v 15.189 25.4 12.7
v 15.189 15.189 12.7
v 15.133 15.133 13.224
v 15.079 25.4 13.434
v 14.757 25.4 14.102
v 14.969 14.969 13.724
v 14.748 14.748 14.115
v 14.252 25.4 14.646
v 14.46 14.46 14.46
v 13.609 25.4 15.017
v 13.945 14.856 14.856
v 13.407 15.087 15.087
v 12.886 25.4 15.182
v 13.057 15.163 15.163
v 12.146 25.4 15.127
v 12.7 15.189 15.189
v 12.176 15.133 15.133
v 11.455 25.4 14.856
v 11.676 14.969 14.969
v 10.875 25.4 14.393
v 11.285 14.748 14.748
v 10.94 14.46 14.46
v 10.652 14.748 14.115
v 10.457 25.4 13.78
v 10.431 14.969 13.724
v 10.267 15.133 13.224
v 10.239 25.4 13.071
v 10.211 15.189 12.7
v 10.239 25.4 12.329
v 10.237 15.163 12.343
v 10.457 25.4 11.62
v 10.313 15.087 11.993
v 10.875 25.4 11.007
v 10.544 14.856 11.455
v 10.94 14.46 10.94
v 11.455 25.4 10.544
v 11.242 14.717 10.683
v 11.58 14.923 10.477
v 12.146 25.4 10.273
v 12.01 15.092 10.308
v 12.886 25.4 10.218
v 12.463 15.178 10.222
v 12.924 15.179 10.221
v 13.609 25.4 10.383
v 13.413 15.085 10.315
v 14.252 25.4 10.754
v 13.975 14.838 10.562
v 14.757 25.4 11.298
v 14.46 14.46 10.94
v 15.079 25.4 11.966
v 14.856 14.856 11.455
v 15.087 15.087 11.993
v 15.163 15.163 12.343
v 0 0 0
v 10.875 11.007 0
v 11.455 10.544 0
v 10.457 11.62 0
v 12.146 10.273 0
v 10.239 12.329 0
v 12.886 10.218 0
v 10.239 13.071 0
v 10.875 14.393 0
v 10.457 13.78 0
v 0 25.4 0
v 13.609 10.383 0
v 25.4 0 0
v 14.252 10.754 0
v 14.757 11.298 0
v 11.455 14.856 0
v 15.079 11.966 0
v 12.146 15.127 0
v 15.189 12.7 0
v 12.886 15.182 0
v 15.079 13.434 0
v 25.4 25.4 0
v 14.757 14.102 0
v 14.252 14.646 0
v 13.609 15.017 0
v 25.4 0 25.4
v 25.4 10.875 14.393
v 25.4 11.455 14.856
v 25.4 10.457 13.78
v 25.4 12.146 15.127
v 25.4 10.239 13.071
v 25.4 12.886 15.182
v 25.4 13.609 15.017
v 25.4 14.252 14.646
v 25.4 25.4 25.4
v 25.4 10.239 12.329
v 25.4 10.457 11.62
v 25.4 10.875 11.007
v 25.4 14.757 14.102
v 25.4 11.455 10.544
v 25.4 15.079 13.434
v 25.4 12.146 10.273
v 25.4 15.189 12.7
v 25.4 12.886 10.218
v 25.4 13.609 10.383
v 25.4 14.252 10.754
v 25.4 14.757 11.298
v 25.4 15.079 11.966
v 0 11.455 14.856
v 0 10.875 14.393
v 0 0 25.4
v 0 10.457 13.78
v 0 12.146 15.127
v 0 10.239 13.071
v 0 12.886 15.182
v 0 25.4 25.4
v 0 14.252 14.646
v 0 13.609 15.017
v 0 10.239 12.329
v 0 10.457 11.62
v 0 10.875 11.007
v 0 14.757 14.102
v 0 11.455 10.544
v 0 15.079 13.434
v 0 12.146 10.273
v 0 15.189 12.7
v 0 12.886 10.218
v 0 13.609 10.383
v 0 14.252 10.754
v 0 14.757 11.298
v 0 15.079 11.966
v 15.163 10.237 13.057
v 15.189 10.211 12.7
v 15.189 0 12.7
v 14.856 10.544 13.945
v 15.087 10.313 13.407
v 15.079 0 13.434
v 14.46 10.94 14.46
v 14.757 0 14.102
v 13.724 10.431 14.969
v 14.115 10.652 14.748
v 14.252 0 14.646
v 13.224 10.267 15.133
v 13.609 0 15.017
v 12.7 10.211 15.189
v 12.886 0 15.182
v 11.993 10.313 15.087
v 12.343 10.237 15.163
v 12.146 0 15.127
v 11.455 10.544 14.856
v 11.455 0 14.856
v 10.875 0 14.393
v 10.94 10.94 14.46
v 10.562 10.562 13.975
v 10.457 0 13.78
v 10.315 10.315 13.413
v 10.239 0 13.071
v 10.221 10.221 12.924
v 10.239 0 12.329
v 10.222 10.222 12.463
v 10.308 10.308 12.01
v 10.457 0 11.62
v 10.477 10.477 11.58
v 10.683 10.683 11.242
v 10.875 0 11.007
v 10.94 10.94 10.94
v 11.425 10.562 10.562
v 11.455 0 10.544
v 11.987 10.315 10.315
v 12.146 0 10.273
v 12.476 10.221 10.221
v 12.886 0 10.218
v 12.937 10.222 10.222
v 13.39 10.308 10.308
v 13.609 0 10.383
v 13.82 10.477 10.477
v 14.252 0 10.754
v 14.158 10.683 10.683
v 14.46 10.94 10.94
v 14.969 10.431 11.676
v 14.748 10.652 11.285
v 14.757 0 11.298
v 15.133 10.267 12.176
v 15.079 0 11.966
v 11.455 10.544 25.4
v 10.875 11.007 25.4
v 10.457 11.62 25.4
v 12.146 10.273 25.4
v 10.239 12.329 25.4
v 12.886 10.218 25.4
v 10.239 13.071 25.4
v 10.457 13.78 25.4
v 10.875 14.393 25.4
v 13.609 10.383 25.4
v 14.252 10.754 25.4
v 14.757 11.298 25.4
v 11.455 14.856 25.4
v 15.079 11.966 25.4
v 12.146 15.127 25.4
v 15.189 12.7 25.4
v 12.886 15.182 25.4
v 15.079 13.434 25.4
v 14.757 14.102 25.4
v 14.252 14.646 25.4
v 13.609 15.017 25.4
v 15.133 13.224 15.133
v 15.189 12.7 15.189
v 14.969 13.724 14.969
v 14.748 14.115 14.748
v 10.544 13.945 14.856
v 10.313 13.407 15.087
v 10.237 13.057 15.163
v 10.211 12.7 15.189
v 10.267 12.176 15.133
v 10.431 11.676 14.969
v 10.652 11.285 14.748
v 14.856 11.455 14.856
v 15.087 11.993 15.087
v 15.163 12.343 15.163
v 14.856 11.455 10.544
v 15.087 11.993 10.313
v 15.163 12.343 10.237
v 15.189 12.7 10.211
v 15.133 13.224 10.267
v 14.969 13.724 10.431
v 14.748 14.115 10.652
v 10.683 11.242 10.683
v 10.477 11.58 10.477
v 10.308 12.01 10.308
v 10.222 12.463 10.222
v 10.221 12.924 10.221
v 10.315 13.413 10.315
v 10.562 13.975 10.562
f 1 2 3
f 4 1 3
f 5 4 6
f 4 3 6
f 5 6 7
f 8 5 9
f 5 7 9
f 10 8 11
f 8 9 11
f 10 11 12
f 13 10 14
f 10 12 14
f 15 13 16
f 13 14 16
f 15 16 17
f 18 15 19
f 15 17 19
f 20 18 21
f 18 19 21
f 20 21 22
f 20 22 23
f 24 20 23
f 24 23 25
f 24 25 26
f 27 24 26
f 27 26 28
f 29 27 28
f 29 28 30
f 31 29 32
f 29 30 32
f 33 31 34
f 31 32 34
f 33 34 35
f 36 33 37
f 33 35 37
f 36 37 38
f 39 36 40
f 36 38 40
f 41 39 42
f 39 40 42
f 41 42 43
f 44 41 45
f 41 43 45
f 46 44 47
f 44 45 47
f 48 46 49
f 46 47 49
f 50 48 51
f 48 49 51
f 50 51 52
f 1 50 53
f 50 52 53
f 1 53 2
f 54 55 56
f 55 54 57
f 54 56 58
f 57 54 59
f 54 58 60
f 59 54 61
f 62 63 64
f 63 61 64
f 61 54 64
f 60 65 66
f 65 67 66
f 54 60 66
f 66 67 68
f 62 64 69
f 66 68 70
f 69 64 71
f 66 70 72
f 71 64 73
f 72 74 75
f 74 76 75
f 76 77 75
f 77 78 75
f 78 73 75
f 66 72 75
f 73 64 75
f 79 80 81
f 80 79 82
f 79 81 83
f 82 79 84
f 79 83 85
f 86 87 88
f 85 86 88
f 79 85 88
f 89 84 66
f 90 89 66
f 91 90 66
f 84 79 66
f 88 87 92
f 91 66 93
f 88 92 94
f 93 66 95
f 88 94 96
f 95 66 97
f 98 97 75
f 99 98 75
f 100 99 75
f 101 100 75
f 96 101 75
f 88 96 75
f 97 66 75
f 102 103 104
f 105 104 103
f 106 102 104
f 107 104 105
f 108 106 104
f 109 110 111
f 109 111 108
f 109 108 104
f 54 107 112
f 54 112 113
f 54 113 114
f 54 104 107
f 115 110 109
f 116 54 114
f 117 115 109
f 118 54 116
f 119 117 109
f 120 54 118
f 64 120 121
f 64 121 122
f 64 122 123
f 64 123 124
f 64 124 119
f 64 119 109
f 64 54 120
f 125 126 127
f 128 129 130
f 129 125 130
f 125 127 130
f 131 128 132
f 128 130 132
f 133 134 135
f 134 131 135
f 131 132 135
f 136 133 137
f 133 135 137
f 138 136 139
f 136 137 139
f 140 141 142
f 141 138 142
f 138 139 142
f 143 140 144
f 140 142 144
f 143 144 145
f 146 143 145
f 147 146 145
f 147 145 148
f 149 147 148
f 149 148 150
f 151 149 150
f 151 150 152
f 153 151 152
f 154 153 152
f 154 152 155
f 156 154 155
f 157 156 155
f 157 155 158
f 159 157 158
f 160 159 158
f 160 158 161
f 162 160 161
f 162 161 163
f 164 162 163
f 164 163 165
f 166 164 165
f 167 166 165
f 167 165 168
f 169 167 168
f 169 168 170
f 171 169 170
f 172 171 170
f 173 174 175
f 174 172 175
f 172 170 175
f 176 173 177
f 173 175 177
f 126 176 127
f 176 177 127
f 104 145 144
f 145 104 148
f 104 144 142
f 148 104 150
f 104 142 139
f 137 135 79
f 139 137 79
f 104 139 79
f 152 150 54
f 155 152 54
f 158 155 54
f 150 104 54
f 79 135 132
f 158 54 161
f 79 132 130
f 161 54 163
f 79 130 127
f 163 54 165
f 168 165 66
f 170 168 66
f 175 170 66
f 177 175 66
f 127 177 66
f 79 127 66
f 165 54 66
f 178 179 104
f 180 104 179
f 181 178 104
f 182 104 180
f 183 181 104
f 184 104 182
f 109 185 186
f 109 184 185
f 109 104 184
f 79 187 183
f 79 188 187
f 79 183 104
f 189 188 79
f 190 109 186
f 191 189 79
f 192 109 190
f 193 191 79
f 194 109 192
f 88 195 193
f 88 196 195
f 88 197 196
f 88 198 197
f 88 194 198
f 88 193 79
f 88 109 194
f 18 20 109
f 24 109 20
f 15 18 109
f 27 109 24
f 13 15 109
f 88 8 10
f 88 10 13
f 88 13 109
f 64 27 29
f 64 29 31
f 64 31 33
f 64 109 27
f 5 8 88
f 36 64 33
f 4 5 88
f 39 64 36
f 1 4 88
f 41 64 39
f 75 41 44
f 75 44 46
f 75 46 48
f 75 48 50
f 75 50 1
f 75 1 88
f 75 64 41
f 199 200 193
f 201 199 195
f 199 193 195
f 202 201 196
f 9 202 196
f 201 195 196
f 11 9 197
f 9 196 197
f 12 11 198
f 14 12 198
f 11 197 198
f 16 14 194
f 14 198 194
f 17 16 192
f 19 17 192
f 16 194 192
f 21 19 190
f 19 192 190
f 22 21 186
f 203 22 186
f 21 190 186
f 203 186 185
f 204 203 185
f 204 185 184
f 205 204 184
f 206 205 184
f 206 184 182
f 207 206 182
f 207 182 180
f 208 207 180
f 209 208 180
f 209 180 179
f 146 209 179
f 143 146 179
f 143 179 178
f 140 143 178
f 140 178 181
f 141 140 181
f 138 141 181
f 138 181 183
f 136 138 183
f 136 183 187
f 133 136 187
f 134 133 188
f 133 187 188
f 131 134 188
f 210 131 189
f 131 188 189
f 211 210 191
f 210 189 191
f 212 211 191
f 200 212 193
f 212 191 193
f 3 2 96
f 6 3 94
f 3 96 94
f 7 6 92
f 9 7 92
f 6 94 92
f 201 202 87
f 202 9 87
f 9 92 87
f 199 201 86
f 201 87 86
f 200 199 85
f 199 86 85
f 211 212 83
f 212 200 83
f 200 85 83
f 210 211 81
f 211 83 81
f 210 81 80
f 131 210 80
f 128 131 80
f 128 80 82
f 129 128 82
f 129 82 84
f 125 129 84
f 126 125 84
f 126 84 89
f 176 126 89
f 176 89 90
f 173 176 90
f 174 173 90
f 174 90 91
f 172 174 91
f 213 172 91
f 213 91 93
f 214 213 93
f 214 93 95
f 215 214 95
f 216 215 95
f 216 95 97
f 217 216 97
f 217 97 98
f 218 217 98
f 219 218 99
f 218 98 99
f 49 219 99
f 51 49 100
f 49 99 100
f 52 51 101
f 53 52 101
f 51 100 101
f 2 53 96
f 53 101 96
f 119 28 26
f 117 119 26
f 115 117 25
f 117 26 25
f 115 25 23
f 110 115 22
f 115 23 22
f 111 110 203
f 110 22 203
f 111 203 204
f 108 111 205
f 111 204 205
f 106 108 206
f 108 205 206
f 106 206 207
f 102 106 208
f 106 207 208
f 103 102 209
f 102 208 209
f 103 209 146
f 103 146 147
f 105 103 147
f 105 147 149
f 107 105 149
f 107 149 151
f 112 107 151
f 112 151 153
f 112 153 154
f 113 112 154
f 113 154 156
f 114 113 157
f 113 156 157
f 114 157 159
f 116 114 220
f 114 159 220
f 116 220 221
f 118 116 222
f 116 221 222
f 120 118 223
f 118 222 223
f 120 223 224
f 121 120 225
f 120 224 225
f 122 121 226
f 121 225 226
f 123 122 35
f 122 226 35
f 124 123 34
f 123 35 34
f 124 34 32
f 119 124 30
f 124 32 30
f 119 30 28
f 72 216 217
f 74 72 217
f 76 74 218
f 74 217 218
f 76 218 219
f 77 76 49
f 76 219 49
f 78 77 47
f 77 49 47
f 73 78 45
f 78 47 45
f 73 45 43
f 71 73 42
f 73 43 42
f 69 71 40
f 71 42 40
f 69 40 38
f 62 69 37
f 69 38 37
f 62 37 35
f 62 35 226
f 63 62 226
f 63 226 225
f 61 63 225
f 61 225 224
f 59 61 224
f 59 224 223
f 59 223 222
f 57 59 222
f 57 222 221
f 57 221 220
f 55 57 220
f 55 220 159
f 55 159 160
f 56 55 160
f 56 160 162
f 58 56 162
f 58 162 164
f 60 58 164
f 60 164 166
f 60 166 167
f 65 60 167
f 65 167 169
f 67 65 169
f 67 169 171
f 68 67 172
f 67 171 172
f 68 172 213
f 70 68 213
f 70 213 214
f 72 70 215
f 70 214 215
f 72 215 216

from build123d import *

# Parameters (mm, degrees)
F0_W     = 25.4
F0_H     = 25.4
F1_DEPTH = 25.4
F2_R     = 2.4892
F3_DEPTH = 25.4
F4_R     = 2.4892
F5_DEPTH = 25.4
F6_R     = 2.4892
F7_DEPTH = 25.4


with BuildPart() as f1:
    # F0 (on Top) → F1 (new body)
    with BuildSketch(Plane.XY):
        with Locations((12.7, 12.7)):
            Rectangle(F0_W, F0_H)
    extrude(amount=F1_DEPTH)

    # F2 (on face) → F3 (cut)
    with BuildSketch(Plane.XY.offset(25.4)):
        with Locations((12.7, 12.7)):
            Circle(F2_R)
    extrude(amount=-F3_DEPTH, mode=Mode.SUBTRACT)

    # F4 (on face) → F5 (cut)
    with BuildSketch(Plane.YZ.offset(25.4)):
        with Locations((12.7, 12.7)):
            Circle(F4_R)
    extrude(amount=-F5_DEPTH, mode=Mode.SUBTRACT)

    # F6 (on face) → F7 (cut)
    with BuildSketch(Plane.XZ):
        with Locations((12.7, 12.7)):
            Circle(F6_R)
    extrude(amount=-F7_DEPTH, mode=Mode.SUBTRACT)


solid = f1.part
